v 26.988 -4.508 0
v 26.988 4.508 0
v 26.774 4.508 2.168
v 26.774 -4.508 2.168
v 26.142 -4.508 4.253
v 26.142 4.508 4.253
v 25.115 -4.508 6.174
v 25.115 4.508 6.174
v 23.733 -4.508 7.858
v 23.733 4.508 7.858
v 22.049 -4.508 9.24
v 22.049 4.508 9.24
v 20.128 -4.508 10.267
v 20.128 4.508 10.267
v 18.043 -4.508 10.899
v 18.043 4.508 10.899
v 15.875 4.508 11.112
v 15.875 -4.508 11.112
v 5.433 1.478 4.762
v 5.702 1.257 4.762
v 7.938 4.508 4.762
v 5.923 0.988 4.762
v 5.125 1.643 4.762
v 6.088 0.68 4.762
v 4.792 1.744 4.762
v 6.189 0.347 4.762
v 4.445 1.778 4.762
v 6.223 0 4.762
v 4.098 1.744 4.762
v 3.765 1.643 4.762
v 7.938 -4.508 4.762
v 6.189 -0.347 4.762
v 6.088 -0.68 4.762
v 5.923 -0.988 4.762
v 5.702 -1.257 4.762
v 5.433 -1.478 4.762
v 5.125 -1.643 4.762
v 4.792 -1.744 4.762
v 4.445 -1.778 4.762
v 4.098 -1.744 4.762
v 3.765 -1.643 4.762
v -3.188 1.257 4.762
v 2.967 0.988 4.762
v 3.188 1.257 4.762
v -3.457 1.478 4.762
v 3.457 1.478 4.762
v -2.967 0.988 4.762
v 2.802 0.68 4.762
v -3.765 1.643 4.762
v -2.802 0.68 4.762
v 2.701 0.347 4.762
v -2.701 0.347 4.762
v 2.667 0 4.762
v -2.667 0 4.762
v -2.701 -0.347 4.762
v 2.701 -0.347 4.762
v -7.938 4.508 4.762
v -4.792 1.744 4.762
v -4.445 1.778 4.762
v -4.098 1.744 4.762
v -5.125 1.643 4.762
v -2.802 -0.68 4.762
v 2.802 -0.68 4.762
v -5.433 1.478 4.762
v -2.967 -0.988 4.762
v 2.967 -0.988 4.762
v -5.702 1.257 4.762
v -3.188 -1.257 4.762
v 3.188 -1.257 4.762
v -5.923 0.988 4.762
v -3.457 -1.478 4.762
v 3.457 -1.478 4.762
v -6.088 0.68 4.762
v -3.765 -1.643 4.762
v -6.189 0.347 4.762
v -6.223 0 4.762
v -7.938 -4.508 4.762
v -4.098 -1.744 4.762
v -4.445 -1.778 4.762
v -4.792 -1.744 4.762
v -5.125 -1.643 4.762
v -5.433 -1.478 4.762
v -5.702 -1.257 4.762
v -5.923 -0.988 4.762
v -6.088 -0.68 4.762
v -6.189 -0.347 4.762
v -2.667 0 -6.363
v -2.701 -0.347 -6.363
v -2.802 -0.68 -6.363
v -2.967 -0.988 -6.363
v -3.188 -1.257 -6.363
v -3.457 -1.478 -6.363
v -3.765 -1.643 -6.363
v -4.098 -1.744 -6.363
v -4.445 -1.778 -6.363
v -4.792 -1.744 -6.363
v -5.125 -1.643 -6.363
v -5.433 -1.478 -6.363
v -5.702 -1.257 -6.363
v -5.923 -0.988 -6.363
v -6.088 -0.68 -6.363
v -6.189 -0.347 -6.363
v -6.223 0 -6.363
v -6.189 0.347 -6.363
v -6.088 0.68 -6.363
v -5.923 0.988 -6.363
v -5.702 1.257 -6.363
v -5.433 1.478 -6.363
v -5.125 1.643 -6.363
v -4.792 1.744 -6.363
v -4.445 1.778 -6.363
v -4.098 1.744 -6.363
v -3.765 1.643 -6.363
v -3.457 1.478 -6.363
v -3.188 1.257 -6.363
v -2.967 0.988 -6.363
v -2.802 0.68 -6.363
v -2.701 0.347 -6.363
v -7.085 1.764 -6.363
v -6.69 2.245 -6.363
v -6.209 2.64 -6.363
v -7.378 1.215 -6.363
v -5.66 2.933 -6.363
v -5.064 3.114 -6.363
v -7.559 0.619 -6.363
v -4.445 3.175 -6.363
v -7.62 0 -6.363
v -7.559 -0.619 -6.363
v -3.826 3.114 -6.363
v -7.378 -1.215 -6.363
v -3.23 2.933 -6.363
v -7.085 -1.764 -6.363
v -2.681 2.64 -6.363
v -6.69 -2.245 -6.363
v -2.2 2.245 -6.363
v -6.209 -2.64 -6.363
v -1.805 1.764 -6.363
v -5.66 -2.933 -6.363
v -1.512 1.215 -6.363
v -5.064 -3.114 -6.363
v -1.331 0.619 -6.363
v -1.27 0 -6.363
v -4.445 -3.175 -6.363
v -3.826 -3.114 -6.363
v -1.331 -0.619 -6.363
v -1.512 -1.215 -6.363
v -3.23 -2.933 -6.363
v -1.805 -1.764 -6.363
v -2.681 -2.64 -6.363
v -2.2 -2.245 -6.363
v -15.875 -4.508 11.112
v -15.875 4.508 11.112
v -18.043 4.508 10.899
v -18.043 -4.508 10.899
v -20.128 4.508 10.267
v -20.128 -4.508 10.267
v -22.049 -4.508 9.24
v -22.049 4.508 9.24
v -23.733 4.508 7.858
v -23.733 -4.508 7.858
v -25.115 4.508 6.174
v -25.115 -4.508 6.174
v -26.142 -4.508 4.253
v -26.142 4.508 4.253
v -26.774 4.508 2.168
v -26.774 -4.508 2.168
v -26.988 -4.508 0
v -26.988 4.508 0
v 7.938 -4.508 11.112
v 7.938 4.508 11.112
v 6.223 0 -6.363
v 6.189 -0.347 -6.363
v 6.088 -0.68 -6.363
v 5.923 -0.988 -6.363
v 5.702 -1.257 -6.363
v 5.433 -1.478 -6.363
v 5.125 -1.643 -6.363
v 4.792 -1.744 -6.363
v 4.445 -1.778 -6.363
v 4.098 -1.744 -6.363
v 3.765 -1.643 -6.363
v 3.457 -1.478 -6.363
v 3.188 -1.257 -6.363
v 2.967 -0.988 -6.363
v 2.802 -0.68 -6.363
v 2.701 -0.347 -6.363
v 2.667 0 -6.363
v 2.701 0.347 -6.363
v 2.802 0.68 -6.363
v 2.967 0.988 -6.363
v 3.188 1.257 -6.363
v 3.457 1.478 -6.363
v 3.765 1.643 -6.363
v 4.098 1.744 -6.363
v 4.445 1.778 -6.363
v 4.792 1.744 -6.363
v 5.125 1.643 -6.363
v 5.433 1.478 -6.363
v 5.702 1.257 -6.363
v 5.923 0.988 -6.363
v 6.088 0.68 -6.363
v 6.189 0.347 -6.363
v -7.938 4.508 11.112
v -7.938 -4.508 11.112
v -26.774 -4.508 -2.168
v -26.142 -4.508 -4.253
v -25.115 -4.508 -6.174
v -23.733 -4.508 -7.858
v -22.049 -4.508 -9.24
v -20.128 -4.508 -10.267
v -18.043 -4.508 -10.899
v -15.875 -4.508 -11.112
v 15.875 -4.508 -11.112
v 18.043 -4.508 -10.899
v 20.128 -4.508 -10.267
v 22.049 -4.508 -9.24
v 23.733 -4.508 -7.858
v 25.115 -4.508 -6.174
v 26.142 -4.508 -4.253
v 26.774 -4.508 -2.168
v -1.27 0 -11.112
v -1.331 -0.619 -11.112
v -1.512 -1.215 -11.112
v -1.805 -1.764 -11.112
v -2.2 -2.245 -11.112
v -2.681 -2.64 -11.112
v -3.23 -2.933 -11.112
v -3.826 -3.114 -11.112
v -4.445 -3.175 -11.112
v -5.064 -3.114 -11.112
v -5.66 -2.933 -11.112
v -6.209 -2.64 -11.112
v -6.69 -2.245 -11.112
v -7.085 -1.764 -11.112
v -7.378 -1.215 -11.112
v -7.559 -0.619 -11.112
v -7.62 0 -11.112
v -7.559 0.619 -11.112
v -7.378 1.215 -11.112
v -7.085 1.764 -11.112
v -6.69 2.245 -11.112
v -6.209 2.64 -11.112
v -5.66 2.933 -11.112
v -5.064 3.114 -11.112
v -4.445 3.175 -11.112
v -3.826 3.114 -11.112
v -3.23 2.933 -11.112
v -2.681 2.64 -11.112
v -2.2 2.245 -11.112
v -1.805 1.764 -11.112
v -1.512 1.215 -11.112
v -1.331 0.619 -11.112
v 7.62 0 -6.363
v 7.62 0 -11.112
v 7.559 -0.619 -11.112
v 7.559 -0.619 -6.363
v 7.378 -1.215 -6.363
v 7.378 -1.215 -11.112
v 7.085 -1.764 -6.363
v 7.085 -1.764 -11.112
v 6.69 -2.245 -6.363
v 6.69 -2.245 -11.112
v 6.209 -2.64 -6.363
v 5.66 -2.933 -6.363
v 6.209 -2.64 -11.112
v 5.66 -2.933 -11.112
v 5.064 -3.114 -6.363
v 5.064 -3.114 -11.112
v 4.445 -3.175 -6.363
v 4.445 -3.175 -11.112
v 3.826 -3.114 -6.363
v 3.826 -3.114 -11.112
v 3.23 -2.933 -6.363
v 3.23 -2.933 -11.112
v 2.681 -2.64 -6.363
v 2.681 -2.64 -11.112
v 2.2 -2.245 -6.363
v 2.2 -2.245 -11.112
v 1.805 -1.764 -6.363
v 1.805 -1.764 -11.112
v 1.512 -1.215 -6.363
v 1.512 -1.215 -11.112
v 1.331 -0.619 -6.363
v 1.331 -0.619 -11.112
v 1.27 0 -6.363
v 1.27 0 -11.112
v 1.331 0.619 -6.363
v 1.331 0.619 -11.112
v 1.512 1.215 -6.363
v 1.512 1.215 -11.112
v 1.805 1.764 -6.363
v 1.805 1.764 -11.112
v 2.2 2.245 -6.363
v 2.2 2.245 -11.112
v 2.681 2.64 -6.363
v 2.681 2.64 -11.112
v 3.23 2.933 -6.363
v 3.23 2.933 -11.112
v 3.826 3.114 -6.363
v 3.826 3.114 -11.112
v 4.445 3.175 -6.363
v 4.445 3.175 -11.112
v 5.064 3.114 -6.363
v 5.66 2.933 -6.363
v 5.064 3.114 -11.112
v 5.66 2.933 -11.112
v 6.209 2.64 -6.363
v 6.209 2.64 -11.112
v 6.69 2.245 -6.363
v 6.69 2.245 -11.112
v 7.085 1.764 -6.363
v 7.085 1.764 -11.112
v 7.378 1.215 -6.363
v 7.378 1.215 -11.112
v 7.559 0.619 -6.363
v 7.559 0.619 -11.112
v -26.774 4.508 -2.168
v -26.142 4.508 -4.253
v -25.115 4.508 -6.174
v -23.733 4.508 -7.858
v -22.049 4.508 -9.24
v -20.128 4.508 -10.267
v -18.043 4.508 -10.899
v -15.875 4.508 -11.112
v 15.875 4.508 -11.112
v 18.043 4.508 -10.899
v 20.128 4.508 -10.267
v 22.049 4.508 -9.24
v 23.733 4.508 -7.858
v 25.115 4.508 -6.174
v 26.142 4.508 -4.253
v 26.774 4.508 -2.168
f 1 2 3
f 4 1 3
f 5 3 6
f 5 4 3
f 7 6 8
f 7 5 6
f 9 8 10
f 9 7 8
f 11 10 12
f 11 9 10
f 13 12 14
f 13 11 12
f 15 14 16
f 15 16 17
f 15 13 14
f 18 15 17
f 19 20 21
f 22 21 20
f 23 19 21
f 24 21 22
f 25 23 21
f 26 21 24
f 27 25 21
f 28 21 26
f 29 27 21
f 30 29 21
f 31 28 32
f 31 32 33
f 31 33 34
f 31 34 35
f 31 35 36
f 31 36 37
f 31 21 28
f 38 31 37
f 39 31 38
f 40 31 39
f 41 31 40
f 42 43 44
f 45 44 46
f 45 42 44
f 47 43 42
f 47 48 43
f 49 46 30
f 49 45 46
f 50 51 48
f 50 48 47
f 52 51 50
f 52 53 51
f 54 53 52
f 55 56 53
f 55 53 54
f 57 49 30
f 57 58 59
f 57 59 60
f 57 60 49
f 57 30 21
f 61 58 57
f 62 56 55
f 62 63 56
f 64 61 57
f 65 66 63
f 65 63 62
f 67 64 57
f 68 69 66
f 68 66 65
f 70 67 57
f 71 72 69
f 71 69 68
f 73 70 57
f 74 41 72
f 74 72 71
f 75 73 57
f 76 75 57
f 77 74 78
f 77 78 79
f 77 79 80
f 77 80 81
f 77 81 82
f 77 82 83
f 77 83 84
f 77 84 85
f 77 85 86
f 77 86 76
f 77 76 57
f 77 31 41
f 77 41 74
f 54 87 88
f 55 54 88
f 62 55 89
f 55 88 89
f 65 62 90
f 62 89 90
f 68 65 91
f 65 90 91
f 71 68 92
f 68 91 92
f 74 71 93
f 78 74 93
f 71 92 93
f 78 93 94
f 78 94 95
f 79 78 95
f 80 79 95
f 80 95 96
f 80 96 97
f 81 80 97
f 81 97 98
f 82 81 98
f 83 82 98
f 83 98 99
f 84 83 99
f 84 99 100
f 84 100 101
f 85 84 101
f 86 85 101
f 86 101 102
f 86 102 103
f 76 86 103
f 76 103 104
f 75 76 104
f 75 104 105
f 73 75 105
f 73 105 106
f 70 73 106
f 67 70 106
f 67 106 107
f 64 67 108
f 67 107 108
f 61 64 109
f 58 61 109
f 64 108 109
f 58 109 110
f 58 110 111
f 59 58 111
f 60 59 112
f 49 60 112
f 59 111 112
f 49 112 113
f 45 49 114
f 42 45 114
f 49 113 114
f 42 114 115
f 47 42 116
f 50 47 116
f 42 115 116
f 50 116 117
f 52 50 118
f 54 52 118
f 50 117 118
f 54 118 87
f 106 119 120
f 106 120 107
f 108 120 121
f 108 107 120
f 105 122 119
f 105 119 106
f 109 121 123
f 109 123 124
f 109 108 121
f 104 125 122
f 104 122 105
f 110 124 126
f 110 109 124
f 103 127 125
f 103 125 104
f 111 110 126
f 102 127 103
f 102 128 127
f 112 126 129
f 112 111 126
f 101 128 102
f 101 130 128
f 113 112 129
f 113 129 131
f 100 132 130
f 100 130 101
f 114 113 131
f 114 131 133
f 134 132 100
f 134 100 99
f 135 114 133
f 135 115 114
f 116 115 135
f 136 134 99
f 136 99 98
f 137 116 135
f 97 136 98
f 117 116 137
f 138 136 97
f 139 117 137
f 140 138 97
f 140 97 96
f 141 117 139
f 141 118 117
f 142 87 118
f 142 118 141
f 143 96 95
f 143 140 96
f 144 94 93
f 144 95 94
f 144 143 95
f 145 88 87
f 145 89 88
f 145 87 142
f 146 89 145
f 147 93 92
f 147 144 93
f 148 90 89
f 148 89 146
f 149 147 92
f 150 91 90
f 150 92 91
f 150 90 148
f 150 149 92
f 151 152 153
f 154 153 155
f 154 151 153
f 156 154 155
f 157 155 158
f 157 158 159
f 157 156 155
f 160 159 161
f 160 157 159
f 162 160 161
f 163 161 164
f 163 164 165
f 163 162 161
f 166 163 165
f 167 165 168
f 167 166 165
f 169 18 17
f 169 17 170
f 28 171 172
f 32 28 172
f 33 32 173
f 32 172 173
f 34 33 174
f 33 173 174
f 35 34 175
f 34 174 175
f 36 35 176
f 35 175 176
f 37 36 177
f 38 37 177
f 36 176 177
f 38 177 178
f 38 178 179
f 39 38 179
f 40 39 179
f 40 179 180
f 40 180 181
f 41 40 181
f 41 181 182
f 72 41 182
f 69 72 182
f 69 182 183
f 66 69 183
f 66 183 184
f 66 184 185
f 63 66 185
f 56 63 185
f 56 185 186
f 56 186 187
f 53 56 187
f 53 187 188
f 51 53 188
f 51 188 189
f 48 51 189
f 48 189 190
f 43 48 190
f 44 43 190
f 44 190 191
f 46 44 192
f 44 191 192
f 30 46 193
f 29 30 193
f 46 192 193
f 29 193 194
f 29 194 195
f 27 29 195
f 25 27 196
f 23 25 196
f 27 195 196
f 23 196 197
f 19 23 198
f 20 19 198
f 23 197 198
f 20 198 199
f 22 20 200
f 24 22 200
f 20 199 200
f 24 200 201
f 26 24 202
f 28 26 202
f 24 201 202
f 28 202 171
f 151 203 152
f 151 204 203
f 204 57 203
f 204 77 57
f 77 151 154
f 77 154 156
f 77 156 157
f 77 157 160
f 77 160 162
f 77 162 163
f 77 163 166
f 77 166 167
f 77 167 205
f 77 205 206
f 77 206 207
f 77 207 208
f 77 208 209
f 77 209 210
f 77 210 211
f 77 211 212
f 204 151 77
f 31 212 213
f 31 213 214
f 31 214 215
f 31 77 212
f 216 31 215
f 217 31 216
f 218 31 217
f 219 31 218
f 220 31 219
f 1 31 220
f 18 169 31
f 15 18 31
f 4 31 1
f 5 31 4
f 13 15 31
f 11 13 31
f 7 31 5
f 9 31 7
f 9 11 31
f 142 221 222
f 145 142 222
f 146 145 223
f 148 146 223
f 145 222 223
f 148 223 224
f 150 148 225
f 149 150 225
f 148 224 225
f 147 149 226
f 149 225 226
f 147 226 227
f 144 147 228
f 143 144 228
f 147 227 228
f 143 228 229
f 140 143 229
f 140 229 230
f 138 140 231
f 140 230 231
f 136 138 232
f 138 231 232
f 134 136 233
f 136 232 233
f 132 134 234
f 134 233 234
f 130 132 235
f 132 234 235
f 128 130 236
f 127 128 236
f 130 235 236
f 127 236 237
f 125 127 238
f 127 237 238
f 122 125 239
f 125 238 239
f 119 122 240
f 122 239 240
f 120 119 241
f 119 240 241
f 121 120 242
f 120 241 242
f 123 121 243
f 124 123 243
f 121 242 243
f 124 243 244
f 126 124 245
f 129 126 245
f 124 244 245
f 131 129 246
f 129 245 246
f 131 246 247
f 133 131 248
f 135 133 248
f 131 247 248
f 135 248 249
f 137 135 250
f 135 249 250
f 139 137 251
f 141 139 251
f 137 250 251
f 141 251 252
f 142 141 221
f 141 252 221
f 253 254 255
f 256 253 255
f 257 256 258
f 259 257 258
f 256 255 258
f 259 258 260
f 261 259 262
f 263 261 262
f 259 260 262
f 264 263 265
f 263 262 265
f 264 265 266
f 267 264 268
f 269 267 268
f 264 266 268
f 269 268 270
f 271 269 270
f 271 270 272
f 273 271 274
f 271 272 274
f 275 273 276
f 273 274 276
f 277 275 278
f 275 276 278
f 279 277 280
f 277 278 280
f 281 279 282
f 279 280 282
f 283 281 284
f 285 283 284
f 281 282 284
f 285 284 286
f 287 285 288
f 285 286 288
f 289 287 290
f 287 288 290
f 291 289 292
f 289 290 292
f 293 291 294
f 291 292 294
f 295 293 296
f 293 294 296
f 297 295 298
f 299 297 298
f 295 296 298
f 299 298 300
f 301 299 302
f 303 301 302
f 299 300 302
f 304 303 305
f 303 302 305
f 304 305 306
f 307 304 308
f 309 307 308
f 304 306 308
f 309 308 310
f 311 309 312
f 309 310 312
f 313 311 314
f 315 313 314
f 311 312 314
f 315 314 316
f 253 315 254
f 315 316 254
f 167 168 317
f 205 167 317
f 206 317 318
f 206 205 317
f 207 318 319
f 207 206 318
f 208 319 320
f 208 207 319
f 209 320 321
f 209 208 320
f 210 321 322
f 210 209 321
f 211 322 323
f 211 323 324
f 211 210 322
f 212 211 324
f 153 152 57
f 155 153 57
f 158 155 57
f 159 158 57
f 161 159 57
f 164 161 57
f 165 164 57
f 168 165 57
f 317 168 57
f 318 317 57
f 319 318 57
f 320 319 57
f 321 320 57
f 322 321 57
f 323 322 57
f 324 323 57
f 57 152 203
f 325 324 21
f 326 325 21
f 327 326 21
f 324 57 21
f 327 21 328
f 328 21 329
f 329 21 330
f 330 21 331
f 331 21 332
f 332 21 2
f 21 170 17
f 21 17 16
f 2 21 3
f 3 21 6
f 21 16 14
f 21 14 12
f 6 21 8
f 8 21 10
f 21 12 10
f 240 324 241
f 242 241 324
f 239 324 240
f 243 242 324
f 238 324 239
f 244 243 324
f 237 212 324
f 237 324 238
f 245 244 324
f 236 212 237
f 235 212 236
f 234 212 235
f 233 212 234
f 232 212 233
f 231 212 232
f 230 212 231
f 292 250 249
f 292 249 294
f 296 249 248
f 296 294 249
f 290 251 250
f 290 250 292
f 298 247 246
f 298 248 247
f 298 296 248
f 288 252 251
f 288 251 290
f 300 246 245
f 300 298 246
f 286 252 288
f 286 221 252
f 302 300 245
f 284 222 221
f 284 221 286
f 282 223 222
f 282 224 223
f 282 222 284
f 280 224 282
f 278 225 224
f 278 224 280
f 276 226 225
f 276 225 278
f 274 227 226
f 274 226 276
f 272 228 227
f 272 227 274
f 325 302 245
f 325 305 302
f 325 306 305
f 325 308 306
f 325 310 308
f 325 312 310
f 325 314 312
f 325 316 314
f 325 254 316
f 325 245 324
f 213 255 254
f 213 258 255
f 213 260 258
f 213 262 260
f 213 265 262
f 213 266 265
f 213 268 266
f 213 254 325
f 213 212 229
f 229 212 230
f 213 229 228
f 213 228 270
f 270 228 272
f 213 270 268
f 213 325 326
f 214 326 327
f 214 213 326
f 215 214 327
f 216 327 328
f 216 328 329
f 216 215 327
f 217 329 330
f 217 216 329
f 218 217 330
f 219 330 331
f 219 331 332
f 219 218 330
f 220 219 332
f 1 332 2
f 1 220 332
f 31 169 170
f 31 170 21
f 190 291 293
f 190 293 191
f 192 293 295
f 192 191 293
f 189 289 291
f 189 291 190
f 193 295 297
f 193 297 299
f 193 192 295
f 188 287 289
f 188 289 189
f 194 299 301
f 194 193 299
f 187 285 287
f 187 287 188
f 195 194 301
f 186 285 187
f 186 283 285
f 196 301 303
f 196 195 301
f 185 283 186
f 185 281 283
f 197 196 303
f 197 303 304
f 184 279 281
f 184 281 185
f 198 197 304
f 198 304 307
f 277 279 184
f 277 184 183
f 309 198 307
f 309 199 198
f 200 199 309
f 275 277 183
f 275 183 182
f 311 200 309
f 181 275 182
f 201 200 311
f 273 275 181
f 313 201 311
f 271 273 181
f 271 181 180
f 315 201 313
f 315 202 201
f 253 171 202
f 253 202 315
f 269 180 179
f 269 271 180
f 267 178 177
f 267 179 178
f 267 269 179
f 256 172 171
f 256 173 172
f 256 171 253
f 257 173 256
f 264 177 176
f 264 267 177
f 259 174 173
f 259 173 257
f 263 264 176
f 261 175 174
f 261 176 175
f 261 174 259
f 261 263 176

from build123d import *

# Parameters (mm, degrees)
F1_DEPTH = 4.5085
F2_R     = 3.175
F3_DEPTH = 4.7498
F4_R     = 1.778
F5_DEPTH = 25.4


with BuildPart() as f1:
    # F0 (on Front) → F1 (new body, symmetric)
    with BuildSketch(Plane.XZ):
        with BuildLine():
            Line((-7.9375, 11.1125), (-15.875, 11.1125))
            ThreePointArc((-15.875, 11.1125), (-23.732724, 7.857724), (-26.9875, 0))
            ThreePointArc((-26.9875, 0), (-23.732724, -7.857724), (-15.875, -11.1125))
            Line((-15.875, -11.1125), (0, -11.1125))
            Line((0, -11.1125), (15.875, -11.1125))
            ThreePointArc((15.875, -11.1125), (23.732724, -7.857724), (26.9875, 0))
            ThreePointArc((26.9875, 0), (23.732724, 7.857724), (15.875, 11.1125))
            Line((15.875, 11.1125), (7.9375, 11.1125))
            Line((7.9375, 11.1125), (7.9375, 4.7625))
            Line((7.9375, 4.7625), (0, 4.7625))
            Line((0, 4.7625), (-7.9375, 4.7625))
            Line((-7.9375, 4.7625), (-7.9375, 11.1125))
        make_face()
    extrude(amount=F1_DEPTH, both=True)

    # F2 (on face) → F3 (cut)
    with BuildSketch(Plane(origin=(0, 0, -11.1125), x_dir=(1, 0, 0), z_dir=(0, 0, -1))):
        with Locations((-4.445, 0)):
            Circle(F2_R)
        with Locations((4.445, 0)):
            Circle(F2_R)
    extrude(amount=-F3_DEPTH, mode=Mode.SUBTRACT)

    # F4 (on face) → F5 (cut)
    with BuildSketch(Plane(origin=(0, 0, -11.1125), x_dir=(1, 0, 0), z_dir=(0, 0, -1))):
        with Locations((-4.445, 0)):
            Circle(F4_R)
        with Locations((4.445, 0)):
            Circle(F4_R)
    extrude(amount=-F5_DEPTH, mode=Mode.SUBTRACT)


solid = f1.part
